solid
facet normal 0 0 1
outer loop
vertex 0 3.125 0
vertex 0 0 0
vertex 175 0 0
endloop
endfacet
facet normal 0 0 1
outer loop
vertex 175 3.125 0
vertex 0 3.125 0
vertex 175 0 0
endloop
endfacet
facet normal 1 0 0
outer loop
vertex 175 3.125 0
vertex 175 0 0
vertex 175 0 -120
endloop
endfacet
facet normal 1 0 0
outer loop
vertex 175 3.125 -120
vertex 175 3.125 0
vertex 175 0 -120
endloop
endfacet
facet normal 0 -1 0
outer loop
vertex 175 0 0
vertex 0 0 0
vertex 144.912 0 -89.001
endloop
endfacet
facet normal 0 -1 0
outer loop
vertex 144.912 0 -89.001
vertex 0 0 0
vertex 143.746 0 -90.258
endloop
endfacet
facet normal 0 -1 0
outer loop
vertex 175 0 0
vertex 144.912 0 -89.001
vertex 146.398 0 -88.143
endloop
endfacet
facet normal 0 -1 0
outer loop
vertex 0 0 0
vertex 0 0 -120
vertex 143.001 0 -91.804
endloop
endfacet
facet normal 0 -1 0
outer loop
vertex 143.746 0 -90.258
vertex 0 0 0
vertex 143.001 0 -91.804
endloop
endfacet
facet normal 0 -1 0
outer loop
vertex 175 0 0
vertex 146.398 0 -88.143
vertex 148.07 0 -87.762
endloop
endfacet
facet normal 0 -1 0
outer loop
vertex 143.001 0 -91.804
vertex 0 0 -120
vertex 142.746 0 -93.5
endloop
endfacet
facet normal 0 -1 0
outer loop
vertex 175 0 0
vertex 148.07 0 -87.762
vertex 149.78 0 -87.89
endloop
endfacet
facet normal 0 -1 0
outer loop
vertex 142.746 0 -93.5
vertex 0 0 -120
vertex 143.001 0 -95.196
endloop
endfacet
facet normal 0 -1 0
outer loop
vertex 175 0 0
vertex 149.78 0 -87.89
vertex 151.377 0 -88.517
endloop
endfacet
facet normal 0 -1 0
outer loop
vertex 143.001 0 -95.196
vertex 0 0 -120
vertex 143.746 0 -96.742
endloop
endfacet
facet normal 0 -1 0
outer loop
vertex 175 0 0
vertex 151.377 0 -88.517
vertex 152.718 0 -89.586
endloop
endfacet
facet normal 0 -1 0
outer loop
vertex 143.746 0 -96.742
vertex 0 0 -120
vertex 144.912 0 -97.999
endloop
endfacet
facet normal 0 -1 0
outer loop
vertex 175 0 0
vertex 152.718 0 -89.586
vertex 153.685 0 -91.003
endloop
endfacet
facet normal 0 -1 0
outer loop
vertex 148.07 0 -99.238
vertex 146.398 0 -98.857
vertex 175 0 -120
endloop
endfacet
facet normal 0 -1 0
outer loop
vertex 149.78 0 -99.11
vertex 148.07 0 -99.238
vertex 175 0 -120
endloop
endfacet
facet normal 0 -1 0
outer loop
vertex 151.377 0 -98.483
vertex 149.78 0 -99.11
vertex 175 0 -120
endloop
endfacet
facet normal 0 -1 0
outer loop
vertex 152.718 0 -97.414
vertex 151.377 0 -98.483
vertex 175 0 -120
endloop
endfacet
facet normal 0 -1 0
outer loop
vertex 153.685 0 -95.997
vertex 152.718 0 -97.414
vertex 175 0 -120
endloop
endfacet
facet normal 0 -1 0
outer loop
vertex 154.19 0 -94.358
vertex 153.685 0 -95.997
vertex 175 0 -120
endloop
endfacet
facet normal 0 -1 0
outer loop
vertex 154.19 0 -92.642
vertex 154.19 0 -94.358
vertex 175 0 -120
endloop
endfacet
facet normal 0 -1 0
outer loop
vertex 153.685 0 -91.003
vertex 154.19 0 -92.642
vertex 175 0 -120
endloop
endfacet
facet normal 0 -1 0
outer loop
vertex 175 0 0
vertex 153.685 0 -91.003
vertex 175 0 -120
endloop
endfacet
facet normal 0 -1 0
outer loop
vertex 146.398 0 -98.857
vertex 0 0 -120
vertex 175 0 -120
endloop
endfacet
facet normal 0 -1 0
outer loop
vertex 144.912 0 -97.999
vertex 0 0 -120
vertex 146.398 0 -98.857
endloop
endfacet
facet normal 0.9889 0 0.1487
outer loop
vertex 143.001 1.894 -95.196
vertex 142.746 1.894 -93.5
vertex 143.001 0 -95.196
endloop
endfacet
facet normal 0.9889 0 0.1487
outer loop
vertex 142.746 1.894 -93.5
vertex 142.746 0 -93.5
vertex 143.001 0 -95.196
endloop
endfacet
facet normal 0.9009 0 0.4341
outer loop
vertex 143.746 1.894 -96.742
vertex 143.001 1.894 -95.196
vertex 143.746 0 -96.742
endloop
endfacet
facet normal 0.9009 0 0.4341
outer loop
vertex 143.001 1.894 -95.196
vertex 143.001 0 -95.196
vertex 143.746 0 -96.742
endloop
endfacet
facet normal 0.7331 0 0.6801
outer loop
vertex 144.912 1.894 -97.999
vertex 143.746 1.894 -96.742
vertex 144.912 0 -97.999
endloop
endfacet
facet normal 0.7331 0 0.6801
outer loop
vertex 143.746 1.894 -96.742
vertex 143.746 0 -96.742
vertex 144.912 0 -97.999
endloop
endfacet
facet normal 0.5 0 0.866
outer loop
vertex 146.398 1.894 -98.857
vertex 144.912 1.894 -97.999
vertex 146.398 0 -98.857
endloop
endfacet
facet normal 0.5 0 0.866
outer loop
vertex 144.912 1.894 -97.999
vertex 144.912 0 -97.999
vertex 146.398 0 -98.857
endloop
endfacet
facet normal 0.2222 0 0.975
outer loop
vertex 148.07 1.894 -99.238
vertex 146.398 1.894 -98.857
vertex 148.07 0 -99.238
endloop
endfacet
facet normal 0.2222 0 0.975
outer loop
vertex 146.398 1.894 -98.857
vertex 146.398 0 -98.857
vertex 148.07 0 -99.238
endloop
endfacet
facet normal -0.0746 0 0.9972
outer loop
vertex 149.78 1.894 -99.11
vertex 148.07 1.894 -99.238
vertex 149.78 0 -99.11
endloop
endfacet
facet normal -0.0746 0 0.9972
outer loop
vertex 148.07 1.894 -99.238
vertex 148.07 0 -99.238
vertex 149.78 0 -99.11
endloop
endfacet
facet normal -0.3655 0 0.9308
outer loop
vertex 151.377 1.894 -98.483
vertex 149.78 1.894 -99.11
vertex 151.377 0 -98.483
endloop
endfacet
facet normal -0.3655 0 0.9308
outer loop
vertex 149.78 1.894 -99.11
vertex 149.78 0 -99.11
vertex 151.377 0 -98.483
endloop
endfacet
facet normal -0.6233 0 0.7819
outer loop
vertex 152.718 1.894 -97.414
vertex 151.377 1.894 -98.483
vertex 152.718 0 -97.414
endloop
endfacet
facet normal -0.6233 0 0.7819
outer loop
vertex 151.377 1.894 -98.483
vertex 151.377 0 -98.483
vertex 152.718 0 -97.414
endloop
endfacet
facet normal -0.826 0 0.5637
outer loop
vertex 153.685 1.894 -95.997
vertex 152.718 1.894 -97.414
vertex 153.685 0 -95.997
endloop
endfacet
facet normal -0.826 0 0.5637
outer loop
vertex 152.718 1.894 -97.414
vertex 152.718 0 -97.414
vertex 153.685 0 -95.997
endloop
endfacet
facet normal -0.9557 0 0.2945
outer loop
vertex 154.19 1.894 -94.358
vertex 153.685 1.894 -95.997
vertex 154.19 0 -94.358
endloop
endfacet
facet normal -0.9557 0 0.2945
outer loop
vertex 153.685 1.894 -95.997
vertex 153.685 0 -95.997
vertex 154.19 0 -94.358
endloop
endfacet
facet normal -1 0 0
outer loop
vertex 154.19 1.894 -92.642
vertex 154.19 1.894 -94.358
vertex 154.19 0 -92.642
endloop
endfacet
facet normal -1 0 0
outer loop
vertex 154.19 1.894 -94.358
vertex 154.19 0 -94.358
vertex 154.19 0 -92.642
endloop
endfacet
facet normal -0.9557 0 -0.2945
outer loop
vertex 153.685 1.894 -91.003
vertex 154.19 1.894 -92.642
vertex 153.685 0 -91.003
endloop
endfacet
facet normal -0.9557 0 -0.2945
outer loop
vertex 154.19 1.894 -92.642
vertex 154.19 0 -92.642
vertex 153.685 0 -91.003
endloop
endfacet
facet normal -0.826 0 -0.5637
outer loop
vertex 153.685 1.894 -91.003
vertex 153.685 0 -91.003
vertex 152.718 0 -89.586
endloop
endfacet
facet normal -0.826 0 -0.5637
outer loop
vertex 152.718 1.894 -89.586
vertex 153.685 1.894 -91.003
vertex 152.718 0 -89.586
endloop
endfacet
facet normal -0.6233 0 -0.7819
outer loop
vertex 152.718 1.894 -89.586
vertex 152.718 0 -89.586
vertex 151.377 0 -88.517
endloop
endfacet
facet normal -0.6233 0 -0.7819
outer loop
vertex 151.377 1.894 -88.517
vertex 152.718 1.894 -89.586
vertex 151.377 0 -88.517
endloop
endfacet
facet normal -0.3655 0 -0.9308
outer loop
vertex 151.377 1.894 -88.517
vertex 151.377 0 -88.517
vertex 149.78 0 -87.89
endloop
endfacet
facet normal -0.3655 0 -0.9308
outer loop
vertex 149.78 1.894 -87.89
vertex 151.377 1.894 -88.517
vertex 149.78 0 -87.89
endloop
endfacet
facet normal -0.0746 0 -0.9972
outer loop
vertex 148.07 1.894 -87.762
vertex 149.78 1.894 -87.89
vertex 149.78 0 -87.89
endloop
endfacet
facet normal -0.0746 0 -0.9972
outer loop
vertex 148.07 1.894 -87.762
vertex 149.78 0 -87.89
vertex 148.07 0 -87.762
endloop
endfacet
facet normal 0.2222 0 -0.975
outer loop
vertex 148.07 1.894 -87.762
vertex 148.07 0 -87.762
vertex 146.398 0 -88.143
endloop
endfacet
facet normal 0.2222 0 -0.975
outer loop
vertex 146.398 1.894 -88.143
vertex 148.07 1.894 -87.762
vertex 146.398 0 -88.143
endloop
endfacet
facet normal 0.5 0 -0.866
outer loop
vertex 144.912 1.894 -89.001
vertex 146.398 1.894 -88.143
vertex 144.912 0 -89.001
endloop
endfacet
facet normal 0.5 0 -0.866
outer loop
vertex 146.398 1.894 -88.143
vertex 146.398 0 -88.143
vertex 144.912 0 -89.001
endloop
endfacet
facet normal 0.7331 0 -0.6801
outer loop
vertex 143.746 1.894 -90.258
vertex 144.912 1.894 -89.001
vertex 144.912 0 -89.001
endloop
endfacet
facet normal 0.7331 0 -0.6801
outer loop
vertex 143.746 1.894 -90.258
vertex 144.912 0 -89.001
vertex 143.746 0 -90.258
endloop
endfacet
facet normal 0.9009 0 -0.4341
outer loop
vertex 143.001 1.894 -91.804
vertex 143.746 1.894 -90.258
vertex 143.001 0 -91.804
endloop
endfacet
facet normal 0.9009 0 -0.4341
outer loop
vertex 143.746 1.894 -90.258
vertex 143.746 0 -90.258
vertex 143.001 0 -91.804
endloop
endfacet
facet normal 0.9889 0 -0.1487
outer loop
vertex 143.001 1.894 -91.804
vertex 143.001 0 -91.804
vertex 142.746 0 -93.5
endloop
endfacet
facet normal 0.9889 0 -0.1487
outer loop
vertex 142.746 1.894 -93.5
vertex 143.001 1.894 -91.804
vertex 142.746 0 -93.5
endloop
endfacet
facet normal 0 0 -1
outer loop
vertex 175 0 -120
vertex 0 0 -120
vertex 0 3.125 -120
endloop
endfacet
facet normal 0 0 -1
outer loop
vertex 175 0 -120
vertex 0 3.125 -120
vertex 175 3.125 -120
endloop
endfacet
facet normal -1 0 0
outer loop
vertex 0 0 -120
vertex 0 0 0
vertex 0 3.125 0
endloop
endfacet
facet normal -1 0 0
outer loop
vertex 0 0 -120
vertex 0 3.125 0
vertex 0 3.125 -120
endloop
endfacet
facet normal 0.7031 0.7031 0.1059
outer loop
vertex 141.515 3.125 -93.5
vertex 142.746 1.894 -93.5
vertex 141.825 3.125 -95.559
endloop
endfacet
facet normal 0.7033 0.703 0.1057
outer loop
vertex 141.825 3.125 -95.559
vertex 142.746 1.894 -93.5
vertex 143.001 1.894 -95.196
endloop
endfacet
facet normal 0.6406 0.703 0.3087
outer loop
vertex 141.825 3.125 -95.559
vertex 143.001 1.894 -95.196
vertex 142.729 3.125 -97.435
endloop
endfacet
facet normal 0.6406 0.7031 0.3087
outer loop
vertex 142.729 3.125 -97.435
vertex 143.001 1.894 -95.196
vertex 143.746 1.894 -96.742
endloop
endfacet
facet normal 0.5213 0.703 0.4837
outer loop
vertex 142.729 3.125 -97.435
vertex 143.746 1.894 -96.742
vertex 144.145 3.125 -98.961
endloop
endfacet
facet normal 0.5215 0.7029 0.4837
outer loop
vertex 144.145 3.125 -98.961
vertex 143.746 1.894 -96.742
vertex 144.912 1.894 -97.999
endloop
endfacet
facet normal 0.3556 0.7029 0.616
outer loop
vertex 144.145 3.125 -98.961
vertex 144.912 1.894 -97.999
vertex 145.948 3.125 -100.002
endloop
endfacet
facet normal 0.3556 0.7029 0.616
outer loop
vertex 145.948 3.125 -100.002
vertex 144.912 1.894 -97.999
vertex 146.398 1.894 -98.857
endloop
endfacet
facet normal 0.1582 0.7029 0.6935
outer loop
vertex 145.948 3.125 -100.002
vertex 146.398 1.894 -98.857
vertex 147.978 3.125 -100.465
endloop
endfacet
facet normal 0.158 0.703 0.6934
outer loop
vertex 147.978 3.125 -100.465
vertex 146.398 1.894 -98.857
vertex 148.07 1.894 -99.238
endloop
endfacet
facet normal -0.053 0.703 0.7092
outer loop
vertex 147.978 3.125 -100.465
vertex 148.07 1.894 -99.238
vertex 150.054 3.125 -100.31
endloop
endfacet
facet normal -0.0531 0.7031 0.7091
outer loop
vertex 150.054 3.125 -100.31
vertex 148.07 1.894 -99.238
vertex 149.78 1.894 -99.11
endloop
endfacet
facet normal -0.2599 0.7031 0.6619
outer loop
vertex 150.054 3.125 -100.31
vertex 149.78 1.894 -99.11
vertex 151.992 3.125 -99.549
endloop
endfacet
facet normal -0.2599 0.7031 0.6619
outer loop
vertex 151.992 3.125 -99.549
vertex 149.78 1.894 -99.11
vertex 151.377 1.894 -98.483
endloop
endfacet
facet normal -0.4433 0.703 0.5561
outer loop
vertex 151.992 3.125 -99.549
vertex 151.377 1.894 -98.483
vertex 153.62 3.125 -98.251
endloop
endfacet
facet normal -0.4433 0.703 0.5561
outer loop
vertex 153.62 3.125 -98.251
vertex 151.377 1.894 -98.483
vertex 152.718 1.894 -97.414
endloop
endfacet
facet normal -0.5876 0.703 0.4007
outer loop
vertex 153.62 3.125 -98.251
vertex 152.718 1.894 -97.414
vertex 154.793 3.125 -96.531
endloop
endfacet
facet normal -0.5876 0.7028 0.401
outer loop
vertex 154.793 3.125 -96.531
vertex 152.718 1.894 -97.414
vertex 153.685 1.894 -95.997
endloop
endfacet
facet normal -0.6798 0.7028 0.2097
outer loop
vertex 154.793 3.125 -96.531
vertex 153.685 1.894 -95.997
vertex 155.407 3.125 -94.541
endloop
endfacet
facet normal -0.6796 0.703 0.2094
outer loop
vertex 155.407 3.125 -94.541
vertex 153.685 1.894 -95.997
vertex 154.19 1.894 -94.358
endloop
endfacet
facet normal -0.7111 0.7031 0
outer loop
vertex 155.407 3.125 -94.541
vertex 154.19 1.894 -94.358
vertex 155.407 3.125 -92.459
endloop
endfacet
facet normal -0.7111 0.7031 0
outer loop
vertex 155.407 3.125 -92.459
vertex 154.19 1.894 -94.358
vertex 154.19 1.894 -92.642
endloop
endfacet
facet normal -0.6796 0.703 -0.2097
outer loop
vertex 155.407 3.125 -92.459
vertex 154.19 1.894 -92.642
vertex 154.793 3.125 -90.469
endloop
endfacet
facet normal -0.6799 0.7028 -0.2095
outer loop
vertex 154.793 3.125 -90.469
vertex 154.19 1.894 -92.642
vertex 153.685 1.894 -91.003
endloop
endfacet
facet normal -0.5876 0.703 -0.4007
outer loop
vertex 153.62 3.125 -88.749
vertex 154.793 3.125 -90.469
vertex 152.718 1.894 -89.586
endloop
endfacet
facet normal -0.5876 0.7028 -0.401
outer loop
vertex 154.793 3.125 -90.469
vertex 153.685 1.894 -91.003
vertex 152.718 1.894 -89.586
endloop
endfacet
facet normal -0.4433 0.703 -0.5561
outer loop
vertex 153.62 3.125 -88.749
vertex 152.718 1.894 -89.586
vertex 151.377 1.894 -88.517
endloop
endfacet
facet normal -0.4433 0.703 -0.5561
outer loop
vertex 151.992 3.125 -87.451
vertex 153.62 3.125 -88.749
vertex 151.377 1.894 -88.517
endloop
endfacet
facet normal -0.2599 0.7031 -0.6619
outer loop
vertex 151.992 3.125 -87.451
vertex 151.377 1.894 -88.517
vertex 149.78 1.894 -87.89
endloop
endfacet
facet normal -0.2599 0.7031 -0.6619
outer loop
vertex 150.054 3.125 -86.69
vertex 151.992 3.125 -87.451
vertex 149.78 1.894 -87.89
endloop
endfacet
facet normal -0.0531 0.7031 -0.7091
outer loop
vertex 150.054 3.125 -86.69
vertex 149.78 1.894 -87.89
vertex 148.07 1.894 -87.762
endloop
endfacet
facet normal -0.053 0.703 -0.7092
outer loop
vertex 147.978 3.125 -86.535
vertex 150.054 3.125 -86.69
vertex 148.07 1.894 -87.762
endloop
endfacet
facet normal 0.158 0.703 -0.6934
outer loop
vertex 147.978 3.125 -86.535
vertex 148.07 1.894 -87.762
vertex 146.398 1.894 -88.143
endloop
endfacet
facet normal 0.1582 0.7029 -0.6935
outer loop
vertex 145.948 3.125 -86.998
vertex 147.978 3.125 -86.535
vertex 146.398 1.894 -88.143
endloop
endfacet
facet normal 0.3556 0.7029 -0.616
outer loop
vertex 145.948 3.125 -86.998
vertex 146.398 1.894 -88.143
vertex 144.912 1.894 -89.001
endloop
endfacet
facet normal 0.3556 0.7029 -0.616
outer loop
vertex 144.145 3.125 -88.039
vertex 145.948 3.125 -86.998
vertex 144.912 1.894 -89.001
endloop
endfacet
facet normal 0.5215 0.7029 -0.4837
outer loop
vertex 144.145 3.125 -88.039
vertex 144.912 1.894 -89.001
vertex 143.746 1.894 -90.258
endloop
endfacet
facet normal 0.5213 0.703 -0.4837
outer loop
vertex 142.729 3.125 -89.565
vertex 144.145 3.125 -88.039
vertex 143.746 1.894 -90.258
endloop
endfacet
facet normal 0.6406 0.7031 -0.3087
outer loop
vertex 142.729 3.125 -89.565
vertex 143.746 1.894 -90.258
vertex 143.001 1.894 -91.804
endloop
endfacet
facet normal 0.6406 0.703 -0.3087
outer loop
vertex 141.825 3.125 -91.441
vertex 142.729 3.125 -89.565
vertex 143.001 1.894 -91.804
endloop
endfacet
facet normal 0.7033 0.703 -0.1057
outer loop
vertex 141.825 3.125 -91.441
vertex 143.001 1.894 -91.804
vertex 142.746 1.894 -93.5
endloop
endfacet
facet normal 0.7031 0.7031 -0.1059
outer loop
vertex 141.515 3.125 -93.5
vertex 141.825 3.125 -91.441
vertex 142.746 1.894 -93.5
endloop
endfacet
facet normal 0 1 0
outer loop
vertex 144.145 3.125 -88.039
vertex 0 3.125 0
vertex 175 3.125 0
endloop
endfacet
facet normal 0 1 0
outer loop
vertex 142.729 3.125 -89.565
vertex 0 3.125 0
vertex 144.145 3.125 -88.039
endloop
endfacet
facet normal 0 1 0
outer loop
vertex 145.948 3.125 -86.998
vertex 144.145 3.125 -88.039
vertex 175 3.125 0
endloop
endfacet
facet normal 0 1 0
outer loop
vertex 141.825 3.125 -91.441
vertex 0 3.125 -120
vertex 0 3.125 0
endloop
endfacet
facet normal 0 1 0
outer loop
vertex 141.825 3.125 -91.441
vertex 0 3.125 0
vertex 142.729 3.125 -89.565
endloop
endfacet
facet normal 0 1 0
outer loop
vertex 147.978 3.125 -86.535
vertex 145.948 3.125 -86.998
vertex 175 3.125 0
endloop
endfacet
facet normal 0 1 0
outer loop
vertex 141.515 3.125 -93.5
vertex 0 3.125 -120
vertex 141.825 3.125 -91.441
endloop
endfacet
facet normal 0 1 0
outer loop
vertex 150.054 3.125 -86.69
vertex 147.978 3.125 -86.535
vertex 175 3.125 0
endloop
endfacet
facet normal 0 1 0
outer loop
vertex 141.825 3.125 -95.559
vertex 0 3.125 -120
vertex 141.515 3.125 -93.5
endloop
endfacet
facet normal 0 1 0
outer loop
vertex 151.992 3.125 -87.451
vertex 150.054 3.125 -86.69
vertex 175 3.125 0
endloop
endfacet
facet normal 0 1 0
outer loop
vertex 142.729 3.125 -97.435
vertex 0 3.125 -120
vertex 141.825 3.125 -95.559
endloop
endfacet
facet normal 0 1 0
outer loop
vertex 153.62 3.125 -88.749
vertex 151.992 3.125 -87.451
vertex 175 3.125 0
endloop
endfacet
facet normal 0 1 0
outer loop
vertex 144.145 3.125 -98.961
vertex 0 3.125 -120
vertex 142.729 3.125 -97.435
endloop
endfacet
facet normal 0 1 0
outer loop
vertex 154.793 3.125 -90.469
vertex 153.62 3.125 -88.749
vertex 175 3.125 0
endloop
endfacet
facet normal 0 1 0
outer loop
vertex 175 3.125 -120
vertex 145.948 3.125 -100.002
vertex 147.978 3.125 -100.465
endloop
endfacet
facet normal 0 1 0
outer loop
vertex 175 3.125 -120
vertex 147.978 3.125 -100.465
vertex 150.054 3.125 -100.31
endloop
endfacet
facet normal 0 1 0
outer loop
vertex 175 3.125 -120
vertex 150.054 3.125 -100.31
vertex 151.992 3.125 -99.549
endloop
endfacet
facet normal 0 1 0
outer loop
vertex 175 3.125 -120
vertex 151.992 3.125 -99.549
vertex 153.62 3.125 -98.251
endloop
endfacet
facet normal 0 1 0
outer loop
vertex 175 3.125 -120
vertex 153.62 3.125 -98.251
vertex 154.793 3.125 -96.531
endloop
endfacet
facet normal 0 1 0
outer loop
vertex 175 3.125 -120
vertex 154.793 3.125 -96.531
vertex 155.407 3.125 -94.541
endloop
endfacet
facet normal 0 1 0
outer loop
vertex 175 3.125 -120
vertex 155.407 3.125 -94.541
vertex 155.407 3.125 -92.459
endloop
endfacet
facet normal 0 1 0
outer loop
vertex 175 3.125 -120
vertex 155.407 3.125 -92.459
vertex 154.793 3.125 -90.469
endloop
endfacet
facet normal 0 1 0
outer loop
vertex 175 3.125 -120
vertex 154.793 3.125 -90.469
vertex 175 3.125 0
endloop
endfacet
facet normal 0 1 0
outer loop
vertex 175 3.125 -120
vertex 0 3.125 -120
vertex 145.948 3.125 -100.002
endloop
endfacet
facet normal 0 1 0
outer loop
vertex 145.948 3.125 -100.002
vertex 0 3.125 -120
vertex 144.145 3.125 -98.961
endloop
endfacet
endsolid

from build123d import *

# Parameters (mm, degrees)
SKETCH1_W                         = 175
SKETCH1_H                         = 120
BOSS_EXTRUDE1_DEPTH               = 3.125
F_1_2_20_TAPPED_HOLE1_D           = 11.50874
F_1_2_20_TAPPED_HOLE1_DEPTH       = 30
F_1_2_20_TAPPED_HOLE1_CSINK_D     = 13.97
F_1_2_20_TAPPED_HOLE1_CSINK_ANGLE = 90
F_1_2_20_TAPPED_HOLE1_TIP         = 3.45757432


with BuildPart() as part:
    # Sketch1 → Boss-Extrude1 (new body)
    with BuildSketch(Plane(origin=(0, 0, 0), x_dir=(1, 0, 0), z_dir=(0, 1, 0))):
        with Locations((87.5, 60)):
            Rectangle(SKETCH1_W, SKETCH1_H)
    extrude(amount=BOSS_EXTRUDE1_DEPTH)

    # 1/2-20 Tapped Hole1
    with Locations(Plane(origin=(0, 3.125, 0), x_dir=(1, 0, 0), z_dir=(0, 1, 0))):
        with Locations((148.5, 93.5)):
            CounterSinkHole(F_1_2_20_TAPPED_HOLE1_D / 2, F_1_2_20_TAPPED_HOLE1_CSINK_D / 2, depth=F_1_2_20_TAPPED_HOLE1_DEPTH, counter_sink_angle=F_1_2_20_TAPPED_HOLE1_CSINK_ANGLE)
            with Locations((0, 0, -(F_1_2_20_TAPPED_HOLE1_DEPTH + F_1_2_20_TAPPED_HOLE1_TIP / 2))):  # 118° drill point
                Cone(0, F_1_2_20_TAPPED_HOLE1_D / 2, F_1_2_20_TAPPED_HOLE1_TIP, mode=Mode.SUBTRACT)


solid = part.part
